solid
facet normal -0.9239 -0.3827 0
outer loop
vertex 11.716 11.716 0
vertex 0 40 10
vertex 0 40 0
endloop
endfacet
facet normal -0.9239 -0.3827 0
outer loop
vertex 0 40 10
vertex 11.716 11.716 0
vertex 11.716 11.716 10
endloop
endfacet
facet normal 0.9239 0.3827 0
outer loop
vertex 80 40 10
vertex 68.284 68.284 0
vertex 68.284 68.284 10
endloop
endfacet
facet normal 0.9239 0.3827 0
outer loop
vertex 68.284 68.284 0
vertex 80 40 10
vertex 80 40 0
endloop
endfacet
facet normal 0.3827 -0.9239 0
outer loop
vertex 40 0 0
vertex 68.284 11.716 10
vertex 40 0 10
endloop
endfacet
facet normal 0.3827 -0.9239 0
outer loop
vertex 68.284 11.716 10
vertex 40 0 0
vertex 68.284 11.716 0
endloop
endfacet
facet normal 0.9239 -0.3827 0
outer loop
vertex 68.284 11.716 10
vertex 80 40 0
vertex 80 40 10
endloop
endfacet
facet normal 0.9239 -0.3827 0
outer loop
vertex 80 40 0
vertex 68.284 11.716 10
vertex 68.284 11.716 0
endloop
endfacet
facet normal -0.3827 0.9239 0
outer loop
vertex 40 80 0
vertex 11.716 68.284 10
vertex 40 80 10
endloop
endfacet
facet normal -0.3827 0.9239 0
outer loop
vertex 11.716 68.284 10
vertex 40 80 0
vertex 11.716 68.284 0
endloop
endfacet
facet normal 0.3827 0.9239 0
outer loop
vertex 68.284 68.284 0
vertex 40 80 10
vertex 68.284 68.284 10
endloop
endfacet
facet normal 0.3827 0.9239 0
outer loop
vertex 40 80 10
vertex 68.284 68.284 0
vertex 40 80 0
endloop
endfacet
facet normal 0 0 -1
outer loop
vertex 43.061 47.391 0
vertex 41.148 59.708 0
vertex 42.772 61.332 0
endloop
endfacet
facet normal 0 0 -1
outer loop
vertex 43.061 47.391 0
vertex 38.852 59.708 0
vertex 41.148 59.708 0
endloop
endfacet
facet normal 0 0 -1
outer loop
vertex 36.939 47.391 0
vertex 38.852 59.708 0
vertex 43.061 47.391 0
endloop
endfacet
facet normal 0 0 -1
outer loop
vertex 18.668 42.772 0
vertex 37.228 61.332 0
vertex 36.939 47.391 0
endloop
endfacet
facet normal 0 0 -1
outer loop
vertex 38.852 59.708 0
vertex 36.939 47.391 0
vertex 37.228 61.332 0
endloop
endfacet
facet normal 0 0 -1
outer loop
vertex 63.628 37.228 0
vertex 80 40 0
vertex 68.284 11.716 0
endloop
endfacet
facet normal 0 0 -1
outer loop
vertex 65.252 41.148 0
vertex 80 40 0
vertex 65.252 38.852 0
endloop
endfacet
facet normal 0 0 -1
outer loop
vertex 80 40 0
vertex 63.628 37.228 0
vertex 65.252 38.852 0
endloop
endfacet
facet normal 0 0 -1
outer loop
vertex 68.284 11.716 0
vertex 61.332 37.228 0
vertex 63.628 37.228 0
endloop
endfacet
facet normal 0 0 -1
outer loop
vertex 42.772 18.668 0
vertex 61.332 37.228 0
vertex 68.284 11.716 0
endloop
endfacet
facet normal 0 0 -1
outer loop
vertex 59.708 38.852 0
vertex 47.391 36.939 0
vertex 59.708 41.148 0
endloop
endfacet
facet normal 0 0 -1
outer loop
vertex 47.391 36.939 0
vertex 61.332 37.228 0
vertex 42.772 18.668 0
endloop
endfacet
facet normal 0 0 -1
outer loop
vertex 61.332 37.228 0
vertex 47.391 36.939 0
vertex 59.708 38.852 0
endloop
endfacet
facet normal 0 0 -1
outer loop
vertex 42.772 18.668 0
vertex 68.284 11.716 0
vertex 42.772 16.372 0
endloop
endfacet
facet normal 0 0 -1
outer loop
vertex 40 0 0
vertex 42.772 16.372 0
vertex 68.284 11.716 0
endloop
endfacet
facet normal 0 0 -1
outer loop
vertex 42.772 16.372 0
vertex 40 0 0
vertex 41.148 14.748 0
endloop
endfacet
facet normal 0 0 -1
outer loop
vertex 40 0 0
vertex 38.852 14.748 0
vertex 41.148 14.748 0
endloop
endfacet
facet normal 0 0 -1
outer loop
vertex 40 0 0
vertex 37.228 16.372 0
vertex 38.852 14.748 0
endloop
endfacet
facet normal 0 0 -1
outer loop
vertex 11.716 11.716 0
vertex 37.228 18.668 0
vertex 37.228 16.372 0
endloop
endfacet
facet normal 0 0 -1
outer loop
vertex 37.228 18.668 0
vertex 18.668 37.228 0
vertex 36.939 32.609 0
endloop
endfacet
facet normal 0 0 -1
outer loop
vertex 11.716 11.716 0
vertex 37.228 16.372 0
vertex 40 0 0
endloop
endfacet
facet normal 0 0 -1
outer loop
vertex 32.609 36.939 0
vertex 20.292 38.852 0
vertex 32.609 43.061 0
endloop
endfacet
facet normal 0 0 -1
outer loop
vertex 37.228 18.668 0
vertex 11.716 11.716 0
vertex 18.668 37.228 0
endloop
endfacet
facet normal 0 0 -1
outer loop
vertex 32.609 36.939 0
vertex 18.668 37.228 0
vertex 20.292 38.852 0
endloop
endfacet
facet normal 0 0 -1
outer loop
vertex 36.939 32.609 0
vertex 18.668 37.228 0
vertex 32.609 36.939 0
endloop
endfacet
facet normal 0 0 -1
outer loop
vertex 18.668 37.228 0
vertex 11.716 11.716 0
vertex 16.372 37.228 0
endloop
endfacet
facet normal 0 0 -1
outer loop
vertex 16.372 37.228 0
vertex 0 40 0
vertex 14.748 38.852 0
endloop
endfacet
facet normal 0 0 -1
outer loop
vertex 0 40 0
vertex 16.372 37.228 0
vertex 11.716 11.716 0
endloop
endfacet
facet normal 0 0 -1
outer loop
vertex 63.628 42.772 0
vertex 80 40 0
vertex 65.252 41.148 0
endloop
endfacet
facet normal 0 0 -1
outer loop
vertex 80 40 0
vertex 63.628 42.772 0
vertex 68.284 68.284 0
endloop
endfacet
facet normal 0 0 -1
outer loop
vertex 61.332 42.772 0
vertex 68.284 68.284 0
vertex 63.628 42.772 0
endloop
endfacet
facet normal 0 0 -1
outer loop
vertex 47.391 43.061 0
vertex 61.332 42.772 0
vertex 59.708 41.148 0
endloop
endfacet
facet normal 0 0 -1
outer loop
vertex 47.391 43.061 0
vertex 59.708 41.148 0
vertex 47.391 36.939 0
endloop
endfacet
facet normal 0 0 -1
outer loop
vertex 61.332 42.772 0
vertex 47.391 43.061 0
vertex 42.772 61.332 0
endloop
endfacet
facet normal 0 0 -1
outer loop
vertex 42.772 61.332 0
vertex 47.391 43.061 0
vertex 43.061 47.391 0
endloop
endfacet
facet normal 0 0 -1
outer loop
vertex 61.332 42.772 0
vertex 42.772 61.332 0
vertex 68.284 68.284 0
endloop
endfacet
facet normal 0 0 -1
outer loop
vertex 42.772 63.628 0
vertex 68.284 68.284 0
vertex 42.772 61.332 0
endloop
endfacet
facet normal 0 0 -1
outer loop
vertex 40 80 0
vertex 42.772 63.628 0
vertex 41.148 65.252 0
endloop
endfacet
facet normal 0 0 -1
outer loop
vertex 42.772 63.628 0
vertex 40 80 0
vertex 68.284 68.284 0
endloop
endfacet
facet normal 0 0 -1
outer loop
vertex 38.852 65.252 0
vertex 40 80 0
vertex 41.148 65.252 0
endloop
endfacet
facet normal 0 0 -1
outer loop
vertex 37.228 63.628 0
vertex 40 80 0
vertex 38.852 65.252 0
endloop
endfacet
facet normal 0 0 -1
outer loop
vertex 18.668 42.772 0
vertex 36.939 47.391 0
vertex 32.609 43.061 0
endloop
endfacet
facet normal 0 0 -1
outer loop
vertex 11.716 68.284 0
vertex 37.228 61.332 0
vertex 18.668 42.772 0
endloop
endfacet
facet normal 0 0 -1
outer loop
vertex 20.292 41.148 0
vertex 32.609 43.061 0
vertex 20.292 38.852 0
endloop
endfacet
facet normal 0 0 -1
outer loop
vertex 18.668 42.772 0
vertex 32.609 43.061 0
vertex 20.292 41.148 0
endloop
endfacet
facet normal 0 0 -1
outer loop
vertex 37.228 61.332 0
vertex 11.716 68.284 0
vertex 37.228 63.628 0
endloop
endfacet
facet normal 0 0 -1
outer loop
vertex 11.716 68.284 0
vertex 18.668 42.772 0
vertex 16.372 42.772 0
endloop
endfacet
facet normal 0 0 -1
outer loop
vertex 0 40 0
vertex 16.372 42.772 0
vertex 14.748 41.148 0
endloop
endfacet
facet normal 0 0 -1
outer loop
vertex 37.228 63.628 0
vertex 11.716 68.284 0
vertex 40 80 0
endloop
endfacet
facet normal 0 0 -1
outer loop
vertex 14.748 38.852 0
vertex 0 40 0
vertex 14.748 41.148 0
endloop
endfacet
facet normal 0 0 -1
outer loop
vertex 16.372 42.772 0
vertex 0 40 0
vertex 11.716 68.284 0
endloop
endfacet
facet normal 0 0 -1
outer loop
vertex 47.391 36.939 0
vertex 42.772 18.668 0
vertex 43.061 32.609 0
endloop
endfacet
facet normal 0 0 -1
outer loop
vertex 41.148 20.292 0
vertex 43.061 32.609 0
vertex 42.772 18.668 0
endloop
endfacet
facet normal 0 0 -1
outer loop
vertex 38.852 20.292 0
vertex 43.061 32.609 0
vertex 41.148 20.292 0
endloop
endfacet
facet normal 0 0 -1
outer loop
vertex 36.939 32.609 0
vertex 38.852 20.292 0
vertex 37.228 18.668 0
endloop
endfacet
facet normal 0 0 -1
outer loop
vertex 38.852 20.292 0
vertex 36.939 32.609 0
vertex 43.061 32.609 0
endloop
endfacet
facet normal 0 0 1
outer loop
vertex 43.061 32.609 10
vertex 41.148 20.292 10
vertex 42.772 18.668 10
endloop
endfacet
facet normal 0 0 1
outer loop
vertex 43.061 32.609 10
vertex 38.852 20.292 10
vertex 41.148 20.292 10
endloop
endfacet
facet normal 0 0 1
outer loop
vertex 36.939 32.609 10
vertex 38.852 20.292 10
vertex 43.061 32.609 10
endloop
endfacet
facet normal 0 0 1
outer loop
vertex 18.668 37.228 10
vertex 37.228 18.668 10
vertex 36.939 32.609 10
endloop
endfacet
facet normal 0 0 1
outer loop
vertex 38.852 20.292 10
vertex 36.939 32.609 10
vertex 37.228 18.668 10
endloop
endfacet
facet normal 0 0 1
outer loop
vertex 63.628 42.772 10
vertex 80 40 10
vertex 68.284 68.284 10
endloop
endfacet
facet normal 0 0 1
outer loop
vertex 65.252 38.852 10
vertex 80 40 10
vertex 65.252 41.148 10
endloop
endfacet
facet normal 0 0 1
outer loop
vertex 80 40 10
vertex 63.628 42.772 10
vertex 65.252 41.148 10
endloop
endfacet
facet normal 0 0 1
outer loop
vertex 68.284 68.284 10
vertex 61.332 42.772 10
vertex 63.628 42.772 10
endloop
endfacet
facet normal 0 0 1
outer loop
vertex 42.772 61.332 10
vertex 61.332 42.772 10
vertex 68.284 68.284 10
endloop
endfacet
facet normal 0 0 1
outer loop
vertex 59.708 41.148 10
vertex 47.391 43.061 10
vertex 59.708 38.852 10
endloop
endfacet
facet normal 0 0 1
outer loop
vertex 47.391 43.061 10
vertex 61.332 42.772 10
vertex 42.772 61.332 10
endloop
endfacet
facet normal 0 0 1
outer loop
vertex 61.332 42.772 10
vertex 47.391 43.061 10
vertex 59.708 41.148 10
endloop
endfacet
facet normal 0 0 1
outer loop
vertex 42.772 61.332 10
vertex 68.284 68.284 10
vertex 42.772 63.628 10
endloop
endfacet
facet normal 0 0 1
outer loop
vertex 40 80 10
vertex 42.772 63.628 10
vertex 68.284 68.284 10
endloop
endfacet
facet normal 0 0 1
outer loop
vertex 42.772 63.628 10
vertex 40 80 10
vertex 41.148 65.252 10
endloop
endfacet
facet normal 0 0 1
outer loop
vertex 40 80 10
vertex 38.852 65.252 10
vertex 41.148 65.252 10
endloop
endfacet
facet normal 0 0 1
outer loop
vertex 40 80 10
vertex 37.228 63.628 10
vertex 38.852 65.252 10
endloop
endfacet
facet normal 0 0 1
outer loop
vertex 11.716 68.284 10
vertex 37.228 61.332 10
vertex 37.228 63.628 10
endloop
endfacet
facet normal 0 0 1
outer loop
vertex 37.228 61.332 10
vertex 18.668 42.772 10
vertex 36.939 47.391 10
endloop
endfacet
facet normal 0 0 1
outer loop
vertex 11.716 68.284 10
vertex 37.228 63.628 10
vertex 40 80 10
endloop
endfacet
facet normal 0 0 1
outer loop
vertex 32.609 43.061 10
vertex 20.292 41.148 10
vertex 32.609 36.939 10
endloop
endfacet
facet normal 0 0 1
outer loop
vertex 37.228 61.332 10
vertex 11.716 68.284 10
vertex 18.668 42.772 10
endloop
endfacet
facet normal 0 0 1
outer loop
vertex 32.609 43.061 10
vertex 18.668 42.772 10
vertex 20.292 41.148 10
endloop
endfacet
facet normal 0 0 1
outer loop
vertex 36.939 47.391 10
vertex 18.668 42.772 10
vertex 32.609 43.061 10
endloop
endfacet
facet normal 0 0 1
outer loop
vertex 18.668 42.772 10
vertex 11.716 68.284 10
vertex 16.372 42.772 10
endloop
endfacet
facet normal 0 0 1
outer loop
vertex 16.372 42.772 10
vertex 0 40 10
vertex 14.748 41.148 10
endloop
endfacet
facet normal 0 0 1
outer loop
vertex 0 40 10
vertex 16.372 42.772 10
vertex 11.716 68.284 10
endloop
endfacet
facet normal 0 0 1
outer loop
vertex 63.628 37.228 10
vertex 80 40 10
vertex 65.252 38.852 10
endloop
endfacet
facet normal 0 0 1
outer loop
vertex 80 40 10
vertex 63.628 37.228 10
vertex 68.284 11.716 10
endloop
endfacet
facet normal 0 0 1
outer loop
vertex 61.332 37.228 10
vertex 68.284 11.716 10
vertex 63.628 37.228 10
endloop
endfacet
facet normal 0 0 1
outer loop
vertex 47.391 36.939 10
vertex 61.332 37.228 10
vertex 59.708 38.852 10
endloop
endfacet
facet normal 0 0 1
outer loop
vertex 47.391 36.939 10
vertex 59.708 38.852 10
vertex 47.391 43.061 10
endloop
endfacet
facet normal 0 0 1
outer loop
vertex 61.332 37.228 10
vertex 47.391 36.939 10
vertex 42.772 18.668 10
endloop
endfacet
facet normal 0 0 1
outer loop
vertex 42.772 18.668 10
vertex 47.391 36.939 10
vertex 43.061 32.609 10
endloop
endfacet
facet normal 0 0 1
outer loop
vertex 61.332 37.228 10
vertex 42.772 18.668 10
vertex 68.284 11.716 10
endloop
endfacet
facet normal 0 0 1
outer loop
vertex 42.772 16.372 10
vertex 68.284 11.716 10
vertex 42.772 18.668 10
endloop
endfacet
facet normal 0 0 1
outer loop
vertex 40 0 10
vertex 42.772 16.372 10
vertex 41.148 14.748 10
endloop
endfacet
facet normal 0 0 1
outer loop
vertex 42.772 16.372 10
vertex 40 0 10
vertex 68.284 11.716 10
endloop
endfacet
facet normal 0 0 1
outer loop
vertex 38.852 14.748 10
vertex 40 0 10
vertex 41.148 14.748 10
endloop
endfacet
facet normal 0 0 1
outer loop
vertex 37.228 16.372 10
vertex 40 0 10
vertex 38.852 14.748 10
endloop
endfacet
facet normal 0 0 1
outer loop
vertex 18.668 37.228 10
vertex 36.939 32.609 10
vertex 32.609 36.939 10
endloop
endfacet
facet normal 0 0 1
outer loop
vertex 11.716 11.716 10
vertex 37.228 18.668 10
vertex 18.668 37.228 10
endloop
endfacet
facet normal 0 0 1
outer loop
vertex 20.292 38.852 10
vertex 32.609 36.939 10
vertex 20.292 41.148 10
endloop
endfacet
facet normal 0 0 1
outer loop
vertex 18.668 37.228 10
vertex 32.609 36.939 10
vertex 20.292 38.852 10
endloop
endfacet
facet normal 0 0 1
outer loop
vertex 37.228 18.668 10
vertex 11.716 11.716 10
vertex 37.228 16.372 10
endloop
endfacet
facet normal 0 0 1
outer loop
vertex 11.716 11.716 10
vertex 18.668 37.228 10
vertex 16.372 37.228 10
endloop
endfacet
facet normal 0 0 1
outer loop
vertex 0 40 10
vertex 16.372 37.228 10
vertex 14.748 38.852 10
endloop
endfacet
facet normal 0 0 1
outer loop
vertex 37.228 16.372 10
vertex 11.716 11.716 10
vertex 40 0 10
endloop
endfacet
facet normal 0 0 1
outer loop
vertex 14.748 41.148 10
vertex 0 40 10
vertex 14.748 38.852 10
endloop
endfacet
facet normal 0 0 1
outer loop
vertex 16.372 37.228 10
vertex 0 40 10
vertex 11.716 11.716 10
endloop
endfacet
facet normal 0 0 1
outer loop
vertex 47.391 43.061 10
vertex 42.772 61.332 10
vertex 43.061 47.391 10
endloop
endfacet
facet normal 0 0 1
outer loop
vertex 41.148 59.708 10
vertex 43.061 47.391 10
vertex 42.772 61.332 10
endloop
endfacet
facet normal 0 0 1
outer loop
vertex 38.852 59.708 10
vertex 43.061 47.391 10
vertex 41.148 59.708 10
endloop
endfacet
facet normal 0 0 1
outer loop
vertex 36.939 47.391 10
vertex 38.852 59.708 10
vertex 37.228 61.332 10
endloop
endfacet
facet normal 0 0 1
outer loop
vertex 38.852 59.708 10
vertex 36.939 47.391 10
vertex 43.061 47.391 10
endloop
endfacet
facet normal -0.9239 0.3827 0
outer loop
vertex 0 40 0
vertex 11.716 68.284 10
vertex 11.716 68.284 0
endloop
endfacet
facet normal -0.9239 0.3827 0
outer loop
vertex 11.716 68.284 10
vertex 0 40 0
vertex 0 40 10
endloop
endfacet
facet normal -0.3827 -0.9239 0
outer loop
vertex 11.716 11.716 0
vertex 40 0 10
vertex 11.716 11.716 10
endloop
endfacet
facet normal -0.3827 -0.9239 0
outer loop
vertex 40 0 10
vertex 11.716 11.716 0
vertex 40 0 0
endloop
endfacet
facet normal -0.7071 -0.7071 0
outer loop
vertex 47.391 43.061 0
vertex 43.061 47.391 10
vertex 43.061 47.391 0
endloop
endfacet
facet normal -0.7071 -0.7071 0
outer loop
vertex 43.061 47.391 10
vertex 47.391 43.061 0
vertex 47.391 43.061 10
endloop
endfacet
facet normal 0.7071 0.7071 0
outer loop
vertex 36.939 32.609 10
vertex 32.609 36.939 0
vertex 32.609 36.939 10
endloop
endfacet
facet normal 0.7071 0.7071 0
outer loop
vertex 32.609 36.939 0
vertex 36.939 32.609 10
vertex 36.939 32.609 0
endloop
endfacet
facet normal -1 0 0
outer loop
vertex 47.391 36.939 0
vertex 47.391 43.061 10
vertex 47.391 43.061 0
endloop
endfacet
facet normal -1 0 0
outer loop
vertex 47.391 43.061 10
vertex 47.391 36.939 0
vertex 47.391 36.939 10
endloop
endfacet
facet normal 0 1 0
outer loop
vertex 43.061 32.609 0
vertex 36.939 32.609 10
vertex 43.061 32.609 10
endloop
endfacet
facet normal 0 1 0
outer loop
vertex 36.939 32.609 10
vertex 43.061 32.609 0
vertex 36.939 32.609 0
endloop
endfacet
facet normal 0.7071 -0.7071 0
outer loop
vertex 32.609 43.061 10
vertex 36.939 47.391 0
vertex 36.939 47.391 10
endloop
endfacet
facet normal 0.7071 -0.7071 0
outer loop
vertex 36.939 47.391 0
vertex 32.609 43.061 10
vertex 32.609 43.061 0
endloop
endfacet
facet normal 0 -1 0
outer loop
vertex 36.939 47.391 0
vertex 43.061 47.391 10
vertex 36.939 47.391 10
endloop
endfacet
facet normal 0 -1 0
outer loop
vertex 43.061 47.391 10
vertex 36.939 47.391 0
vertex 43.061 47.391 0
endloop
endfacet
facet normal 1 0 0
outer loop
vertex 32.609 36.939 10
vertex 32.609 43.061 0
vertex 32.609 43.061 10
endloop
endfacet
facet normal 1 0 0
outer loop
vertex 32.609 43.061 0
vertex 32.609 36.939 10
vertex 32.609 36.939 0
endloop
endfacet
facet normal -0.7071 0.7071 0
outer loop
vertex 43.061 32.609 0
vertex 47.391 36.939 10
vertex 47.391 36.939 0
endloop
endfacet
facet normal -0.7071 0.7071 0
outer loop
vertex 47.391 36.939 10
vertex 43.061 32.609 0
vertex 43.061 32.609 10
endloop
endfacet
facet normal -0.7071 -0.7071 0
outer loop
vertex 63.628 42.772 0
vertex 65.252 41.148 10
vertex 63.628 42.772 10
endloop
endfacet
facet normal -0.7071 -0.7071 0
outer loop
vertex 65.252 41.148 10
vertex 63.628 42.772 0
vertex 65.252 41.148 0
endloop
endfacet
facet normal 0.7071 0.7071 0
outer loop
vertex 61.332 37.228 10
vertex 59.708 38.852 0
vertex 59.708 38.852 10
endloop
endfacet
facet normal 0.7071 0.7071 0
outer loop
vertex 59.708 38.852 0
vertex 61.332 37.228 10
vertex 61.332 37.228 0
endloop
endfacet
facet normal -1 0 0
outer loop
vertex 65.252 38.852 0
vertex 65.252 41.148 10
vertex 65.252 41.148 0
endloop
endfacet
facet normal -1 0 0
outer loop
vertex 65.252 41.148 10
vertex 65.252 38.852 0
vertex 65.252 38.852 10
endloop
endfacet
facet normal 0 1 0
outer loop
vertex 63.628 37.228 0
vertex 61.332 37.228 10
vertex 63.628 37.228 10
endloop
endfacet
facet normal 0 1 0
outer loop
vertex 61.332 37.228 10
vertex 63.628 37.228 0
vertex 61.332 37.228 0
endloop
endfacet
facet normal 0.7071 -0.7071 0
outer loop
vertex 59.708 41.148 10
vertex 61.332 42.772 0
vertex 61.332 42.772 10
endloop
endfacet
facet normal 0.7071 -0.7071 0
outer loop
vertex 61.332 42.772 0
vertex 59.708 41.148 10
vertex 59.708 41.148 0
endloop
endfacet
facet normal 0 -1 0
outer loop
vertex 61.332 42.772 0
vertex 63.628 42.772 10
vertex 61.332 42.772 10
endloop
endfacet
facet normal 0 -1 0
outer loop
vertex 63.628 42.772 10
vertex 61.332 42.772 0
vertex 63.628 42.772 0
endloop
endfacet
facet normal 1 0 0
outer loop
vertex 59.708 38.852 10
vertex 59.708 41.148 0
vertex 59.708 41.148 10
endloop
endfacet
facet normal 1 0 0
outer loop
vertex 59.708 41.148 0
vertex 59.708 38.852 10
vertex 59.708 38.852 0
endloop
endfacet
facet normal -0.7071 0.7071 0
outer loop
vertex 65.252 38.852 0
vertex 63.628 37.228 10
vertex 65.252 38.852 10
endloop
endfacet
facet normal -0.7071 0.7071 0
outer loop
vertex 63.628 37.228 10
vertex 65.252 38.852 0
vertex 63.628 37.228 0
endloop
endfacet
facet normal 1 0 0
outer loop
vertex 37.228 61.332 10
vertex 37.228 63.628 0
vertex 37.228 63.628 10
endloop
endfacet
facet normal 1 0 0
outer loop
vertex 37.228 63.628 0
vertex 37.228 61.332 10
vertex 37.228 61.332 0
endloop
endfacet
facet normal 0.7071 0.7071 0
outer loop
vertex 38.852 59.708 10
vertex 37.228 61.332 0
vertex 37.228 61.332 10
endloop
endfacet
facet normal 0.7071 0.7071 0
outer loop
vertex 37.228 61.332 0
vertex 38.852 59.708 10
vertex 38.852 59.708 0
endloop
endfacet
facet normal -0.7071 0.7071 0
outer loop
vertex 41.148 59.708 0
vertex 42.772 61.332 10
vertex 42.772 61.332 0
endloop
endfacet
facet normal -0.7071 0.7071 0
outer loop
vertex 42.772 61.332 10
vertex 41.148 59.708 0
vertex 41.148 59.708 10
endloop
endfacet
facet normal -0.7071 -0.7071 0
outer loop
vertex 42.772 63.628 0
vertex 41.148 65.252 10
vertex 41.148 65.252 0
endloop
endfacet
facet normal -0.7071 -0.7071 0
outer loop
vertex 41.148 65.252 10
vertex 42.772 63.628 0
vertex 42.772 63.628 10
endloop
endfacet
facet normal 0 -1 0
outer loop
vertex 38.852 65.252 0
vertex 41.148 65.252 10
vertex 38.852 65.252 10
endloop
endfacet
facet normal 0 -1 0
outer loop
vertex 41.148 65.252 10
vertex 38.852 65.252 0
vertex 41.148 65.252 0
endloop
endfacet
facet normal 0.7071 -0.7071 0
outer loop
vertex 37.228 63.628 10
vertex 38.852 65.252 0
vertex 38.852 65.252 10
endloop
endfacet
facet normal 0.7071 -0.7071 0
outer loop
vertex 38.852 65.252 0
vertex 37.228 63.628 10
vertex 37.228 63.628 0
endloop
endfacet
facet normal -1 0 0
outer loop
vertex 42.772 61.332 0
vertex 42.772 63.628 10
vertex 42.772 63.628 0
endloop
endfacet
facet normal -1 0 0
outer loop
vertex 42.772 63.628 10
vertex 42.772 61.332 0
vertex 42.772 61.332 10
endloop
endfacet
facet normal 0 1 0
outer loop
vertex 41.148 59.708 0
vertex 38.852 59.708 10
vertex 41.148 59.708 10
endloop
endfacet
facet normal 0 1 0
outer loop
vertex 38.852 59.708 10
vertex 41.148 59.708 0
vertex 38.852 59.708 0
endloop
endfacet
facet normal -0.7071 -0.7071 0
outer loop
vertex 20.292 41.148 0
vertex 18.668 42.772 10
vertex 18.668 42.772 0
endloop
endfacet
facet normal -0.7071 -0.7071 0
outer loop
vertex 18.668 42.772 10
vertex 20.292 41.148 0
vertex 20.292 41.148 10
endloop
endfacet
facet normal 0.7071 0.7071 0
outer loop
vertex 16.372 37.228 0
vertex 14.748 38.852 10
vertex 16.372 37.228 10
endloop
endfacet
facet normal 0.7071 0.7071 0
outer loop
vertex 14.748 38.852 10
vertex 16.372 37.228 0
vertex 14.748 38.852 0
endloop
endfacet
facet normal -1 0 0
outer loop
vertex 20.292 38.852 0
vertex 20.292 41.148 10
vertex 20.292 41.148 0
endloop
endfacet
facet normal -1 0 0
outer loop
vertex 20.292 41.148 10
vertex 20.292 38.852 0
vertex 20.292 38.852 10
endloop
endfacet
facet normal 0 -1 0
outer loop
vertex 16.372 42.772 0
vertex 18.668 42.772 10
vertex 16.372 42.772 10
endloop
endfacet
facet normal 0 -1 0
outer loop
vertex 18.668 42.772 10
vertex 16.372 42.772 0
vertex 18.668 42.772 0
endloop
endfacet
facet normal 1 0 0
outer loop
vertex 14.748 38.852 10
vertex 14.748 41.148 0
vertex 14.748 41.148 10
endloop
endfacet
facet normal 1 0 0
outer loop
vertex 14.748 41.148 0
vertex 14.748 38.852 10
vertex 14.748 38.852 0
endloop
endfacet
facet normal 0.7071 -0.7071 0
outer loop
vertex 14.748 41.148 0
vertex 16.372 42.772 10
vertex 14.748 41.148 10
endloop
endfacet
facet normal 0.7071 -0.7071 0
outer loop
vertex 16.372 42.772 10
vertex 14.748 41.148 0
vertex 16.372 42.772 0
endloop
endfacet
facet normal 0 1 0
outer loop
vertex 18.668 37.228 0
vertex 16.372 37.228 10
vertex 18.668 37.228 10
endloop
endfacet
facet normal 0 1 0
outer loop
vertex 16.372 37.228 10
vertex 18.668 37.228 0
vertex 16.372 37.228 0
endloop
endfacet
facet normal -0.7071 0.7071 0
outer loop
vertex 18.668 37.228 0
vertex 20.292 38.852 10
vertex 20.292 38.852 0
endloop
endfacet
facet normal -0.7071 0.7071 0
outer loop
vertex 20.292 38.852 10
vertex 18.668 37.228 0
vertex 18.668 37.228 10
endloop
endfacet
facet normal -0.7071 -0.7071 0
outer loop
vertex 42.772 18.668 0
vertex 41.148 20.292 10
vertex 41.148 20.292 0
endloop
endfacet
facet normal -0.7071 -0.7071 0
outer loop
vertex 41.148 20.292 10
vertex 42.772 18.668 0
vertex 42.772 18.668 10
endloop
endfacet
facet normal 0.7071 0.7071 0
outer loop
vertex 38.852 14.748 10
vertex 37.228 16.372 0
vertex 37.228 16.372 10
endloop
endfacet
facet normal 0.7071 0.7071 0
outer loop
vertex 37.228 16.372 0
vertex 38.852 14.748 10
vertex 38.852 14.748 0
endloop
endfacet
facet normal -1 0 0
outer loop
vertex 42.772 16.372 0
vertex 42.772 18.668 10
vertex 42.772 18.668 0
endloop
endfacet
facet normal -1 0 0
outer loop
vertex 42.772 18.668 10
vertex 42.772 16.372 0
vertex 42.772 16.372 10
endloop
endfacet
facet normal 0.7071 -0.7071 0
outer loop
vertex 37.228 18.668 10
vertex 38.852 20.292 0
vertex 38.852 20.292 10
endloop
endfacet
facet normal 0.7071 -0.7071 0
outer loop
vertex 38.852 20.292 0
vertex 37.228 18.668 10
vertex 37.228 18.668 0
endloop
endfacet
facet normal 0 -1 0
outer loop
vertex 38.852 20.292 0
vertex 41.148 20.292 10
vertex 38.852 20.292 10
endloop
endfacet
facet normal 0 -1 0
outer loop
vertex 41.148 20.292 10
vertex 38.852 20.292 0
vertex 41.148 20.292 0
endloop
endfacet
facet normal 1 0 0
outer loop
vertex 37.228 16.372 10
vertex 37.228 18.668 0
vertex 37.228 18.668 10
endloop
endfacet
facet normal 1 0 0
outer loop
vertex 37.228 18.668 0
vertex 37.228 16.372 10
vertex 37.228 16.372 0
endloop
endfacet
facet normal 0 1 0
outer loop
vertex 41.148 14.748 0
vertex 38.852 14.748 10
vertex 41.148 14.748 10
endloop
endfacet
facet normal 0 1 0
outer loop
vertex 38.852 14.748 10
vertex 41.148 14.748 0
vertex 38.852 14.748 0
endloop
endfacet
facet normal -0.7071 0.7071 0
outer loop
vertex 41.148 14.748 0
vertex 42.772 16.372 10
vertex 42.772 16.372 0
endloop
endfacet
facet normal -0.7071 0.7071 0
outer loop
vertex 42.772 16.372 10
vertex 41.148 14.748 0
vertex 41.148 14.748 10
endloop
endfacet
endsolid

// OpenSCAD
$fn = 32;

// ----------------------------------------------------------------------
// Polygon plate: 8-gon R40, 4 bolt windows
// ----------------------------------------------------------------------

// --- parameters (mm) ---
sides = 8;                // number of polygon sides
plate_r = 40;             // circumscribed radius of the polygon
bore_r = 8;               // centre bore radius
bolts = 4;                // number of bolt windows
ring_r = 22.48;           // bolt-circle radius
bolt_r = 3;               // bolt window radius
plate_t = 10;             // plate thickness, Z (extrusion height)

plate_d = 2 * plate_r;  // circumscribed diameter
bore_d = 2 * bore_r;  // centre bore diameter
bolt_d = 2 * bolt_r;  // bolt window diameter
ring_d = 2 * ring_r;  // bolt-circle diameter

profile = [[80, 40], [68.284, 68.284], [40, 80], [11.716, 68.284], [0, 40], [11.716, 11.716], [40, 0], [68.284, 11.716]];  // primary outline, 8 points, counter clockwise
void_1 = [[47.391, 43.061], [43.061, 47.391], [36.939, 47.391], [32.609, 43.061], [32.609, 36.939], [36.939, 32.609], [43.061, 32.609], [47.391, 36.939]];  // centre bore, 8 points
void_2 = [[65.252, 41.148], [63.628, 42.772], [61.332, 42.772], [59.708, 41.148], [59.708, 38.852], [61.332, 37.228], [63.628, 37.228], [65.252, 38.852]];  // bolt window 1, 8 points
void_3 = [[42.772, 63.628], [41.148, 65.252], [38.852, 65.252], [37.228, 63.628], [37.228, 61.332], [38.852, 59.708], [41.148, 59.708], [42.772, 61.332]];  // bolt window 2, 8 points
void_4 = [[20.292, 41.148], [18.668, 42.772], [16.372, 42.772], [14.748, 41.148], [14.748, 38.852], [16.372, 37.228], [18.668, 37.228], [20.292, 38.852]];  // bolt window 3, 8 points
void_5 = [[42.772, 18.668], [41.148, 20.292], [38.852, 20.292], [37.228, 18.668], [37.228, 16.372], [38.852, 14.748], [41.148, 14.748], [42.772, 16.372]];  // bolt window 4, 8 points

// --- the one profile operation ---
difference() {
  linear_extrude(height = plate_t) polygon(points = profile);
  translate([0, 0, -1])
    linear_extrude(height = plate_t + 2) polygon(points = void_1);
  translate([0, 0, -1])
    linear_extrude(height = plate_t + 2) polygon(points = void_2);
  translate([0, 0, -1])
    linear_extrude(height = plate_t + 2) polygon(points = void_3);
  translate([0, 0, -1])
    linear_extrude(height = plate_t + 2) polygon(points = void_4);
  translate([0, 0, -1])
    linear_extrude(height = plate_t + 2) polygon(points = void_5);
}
